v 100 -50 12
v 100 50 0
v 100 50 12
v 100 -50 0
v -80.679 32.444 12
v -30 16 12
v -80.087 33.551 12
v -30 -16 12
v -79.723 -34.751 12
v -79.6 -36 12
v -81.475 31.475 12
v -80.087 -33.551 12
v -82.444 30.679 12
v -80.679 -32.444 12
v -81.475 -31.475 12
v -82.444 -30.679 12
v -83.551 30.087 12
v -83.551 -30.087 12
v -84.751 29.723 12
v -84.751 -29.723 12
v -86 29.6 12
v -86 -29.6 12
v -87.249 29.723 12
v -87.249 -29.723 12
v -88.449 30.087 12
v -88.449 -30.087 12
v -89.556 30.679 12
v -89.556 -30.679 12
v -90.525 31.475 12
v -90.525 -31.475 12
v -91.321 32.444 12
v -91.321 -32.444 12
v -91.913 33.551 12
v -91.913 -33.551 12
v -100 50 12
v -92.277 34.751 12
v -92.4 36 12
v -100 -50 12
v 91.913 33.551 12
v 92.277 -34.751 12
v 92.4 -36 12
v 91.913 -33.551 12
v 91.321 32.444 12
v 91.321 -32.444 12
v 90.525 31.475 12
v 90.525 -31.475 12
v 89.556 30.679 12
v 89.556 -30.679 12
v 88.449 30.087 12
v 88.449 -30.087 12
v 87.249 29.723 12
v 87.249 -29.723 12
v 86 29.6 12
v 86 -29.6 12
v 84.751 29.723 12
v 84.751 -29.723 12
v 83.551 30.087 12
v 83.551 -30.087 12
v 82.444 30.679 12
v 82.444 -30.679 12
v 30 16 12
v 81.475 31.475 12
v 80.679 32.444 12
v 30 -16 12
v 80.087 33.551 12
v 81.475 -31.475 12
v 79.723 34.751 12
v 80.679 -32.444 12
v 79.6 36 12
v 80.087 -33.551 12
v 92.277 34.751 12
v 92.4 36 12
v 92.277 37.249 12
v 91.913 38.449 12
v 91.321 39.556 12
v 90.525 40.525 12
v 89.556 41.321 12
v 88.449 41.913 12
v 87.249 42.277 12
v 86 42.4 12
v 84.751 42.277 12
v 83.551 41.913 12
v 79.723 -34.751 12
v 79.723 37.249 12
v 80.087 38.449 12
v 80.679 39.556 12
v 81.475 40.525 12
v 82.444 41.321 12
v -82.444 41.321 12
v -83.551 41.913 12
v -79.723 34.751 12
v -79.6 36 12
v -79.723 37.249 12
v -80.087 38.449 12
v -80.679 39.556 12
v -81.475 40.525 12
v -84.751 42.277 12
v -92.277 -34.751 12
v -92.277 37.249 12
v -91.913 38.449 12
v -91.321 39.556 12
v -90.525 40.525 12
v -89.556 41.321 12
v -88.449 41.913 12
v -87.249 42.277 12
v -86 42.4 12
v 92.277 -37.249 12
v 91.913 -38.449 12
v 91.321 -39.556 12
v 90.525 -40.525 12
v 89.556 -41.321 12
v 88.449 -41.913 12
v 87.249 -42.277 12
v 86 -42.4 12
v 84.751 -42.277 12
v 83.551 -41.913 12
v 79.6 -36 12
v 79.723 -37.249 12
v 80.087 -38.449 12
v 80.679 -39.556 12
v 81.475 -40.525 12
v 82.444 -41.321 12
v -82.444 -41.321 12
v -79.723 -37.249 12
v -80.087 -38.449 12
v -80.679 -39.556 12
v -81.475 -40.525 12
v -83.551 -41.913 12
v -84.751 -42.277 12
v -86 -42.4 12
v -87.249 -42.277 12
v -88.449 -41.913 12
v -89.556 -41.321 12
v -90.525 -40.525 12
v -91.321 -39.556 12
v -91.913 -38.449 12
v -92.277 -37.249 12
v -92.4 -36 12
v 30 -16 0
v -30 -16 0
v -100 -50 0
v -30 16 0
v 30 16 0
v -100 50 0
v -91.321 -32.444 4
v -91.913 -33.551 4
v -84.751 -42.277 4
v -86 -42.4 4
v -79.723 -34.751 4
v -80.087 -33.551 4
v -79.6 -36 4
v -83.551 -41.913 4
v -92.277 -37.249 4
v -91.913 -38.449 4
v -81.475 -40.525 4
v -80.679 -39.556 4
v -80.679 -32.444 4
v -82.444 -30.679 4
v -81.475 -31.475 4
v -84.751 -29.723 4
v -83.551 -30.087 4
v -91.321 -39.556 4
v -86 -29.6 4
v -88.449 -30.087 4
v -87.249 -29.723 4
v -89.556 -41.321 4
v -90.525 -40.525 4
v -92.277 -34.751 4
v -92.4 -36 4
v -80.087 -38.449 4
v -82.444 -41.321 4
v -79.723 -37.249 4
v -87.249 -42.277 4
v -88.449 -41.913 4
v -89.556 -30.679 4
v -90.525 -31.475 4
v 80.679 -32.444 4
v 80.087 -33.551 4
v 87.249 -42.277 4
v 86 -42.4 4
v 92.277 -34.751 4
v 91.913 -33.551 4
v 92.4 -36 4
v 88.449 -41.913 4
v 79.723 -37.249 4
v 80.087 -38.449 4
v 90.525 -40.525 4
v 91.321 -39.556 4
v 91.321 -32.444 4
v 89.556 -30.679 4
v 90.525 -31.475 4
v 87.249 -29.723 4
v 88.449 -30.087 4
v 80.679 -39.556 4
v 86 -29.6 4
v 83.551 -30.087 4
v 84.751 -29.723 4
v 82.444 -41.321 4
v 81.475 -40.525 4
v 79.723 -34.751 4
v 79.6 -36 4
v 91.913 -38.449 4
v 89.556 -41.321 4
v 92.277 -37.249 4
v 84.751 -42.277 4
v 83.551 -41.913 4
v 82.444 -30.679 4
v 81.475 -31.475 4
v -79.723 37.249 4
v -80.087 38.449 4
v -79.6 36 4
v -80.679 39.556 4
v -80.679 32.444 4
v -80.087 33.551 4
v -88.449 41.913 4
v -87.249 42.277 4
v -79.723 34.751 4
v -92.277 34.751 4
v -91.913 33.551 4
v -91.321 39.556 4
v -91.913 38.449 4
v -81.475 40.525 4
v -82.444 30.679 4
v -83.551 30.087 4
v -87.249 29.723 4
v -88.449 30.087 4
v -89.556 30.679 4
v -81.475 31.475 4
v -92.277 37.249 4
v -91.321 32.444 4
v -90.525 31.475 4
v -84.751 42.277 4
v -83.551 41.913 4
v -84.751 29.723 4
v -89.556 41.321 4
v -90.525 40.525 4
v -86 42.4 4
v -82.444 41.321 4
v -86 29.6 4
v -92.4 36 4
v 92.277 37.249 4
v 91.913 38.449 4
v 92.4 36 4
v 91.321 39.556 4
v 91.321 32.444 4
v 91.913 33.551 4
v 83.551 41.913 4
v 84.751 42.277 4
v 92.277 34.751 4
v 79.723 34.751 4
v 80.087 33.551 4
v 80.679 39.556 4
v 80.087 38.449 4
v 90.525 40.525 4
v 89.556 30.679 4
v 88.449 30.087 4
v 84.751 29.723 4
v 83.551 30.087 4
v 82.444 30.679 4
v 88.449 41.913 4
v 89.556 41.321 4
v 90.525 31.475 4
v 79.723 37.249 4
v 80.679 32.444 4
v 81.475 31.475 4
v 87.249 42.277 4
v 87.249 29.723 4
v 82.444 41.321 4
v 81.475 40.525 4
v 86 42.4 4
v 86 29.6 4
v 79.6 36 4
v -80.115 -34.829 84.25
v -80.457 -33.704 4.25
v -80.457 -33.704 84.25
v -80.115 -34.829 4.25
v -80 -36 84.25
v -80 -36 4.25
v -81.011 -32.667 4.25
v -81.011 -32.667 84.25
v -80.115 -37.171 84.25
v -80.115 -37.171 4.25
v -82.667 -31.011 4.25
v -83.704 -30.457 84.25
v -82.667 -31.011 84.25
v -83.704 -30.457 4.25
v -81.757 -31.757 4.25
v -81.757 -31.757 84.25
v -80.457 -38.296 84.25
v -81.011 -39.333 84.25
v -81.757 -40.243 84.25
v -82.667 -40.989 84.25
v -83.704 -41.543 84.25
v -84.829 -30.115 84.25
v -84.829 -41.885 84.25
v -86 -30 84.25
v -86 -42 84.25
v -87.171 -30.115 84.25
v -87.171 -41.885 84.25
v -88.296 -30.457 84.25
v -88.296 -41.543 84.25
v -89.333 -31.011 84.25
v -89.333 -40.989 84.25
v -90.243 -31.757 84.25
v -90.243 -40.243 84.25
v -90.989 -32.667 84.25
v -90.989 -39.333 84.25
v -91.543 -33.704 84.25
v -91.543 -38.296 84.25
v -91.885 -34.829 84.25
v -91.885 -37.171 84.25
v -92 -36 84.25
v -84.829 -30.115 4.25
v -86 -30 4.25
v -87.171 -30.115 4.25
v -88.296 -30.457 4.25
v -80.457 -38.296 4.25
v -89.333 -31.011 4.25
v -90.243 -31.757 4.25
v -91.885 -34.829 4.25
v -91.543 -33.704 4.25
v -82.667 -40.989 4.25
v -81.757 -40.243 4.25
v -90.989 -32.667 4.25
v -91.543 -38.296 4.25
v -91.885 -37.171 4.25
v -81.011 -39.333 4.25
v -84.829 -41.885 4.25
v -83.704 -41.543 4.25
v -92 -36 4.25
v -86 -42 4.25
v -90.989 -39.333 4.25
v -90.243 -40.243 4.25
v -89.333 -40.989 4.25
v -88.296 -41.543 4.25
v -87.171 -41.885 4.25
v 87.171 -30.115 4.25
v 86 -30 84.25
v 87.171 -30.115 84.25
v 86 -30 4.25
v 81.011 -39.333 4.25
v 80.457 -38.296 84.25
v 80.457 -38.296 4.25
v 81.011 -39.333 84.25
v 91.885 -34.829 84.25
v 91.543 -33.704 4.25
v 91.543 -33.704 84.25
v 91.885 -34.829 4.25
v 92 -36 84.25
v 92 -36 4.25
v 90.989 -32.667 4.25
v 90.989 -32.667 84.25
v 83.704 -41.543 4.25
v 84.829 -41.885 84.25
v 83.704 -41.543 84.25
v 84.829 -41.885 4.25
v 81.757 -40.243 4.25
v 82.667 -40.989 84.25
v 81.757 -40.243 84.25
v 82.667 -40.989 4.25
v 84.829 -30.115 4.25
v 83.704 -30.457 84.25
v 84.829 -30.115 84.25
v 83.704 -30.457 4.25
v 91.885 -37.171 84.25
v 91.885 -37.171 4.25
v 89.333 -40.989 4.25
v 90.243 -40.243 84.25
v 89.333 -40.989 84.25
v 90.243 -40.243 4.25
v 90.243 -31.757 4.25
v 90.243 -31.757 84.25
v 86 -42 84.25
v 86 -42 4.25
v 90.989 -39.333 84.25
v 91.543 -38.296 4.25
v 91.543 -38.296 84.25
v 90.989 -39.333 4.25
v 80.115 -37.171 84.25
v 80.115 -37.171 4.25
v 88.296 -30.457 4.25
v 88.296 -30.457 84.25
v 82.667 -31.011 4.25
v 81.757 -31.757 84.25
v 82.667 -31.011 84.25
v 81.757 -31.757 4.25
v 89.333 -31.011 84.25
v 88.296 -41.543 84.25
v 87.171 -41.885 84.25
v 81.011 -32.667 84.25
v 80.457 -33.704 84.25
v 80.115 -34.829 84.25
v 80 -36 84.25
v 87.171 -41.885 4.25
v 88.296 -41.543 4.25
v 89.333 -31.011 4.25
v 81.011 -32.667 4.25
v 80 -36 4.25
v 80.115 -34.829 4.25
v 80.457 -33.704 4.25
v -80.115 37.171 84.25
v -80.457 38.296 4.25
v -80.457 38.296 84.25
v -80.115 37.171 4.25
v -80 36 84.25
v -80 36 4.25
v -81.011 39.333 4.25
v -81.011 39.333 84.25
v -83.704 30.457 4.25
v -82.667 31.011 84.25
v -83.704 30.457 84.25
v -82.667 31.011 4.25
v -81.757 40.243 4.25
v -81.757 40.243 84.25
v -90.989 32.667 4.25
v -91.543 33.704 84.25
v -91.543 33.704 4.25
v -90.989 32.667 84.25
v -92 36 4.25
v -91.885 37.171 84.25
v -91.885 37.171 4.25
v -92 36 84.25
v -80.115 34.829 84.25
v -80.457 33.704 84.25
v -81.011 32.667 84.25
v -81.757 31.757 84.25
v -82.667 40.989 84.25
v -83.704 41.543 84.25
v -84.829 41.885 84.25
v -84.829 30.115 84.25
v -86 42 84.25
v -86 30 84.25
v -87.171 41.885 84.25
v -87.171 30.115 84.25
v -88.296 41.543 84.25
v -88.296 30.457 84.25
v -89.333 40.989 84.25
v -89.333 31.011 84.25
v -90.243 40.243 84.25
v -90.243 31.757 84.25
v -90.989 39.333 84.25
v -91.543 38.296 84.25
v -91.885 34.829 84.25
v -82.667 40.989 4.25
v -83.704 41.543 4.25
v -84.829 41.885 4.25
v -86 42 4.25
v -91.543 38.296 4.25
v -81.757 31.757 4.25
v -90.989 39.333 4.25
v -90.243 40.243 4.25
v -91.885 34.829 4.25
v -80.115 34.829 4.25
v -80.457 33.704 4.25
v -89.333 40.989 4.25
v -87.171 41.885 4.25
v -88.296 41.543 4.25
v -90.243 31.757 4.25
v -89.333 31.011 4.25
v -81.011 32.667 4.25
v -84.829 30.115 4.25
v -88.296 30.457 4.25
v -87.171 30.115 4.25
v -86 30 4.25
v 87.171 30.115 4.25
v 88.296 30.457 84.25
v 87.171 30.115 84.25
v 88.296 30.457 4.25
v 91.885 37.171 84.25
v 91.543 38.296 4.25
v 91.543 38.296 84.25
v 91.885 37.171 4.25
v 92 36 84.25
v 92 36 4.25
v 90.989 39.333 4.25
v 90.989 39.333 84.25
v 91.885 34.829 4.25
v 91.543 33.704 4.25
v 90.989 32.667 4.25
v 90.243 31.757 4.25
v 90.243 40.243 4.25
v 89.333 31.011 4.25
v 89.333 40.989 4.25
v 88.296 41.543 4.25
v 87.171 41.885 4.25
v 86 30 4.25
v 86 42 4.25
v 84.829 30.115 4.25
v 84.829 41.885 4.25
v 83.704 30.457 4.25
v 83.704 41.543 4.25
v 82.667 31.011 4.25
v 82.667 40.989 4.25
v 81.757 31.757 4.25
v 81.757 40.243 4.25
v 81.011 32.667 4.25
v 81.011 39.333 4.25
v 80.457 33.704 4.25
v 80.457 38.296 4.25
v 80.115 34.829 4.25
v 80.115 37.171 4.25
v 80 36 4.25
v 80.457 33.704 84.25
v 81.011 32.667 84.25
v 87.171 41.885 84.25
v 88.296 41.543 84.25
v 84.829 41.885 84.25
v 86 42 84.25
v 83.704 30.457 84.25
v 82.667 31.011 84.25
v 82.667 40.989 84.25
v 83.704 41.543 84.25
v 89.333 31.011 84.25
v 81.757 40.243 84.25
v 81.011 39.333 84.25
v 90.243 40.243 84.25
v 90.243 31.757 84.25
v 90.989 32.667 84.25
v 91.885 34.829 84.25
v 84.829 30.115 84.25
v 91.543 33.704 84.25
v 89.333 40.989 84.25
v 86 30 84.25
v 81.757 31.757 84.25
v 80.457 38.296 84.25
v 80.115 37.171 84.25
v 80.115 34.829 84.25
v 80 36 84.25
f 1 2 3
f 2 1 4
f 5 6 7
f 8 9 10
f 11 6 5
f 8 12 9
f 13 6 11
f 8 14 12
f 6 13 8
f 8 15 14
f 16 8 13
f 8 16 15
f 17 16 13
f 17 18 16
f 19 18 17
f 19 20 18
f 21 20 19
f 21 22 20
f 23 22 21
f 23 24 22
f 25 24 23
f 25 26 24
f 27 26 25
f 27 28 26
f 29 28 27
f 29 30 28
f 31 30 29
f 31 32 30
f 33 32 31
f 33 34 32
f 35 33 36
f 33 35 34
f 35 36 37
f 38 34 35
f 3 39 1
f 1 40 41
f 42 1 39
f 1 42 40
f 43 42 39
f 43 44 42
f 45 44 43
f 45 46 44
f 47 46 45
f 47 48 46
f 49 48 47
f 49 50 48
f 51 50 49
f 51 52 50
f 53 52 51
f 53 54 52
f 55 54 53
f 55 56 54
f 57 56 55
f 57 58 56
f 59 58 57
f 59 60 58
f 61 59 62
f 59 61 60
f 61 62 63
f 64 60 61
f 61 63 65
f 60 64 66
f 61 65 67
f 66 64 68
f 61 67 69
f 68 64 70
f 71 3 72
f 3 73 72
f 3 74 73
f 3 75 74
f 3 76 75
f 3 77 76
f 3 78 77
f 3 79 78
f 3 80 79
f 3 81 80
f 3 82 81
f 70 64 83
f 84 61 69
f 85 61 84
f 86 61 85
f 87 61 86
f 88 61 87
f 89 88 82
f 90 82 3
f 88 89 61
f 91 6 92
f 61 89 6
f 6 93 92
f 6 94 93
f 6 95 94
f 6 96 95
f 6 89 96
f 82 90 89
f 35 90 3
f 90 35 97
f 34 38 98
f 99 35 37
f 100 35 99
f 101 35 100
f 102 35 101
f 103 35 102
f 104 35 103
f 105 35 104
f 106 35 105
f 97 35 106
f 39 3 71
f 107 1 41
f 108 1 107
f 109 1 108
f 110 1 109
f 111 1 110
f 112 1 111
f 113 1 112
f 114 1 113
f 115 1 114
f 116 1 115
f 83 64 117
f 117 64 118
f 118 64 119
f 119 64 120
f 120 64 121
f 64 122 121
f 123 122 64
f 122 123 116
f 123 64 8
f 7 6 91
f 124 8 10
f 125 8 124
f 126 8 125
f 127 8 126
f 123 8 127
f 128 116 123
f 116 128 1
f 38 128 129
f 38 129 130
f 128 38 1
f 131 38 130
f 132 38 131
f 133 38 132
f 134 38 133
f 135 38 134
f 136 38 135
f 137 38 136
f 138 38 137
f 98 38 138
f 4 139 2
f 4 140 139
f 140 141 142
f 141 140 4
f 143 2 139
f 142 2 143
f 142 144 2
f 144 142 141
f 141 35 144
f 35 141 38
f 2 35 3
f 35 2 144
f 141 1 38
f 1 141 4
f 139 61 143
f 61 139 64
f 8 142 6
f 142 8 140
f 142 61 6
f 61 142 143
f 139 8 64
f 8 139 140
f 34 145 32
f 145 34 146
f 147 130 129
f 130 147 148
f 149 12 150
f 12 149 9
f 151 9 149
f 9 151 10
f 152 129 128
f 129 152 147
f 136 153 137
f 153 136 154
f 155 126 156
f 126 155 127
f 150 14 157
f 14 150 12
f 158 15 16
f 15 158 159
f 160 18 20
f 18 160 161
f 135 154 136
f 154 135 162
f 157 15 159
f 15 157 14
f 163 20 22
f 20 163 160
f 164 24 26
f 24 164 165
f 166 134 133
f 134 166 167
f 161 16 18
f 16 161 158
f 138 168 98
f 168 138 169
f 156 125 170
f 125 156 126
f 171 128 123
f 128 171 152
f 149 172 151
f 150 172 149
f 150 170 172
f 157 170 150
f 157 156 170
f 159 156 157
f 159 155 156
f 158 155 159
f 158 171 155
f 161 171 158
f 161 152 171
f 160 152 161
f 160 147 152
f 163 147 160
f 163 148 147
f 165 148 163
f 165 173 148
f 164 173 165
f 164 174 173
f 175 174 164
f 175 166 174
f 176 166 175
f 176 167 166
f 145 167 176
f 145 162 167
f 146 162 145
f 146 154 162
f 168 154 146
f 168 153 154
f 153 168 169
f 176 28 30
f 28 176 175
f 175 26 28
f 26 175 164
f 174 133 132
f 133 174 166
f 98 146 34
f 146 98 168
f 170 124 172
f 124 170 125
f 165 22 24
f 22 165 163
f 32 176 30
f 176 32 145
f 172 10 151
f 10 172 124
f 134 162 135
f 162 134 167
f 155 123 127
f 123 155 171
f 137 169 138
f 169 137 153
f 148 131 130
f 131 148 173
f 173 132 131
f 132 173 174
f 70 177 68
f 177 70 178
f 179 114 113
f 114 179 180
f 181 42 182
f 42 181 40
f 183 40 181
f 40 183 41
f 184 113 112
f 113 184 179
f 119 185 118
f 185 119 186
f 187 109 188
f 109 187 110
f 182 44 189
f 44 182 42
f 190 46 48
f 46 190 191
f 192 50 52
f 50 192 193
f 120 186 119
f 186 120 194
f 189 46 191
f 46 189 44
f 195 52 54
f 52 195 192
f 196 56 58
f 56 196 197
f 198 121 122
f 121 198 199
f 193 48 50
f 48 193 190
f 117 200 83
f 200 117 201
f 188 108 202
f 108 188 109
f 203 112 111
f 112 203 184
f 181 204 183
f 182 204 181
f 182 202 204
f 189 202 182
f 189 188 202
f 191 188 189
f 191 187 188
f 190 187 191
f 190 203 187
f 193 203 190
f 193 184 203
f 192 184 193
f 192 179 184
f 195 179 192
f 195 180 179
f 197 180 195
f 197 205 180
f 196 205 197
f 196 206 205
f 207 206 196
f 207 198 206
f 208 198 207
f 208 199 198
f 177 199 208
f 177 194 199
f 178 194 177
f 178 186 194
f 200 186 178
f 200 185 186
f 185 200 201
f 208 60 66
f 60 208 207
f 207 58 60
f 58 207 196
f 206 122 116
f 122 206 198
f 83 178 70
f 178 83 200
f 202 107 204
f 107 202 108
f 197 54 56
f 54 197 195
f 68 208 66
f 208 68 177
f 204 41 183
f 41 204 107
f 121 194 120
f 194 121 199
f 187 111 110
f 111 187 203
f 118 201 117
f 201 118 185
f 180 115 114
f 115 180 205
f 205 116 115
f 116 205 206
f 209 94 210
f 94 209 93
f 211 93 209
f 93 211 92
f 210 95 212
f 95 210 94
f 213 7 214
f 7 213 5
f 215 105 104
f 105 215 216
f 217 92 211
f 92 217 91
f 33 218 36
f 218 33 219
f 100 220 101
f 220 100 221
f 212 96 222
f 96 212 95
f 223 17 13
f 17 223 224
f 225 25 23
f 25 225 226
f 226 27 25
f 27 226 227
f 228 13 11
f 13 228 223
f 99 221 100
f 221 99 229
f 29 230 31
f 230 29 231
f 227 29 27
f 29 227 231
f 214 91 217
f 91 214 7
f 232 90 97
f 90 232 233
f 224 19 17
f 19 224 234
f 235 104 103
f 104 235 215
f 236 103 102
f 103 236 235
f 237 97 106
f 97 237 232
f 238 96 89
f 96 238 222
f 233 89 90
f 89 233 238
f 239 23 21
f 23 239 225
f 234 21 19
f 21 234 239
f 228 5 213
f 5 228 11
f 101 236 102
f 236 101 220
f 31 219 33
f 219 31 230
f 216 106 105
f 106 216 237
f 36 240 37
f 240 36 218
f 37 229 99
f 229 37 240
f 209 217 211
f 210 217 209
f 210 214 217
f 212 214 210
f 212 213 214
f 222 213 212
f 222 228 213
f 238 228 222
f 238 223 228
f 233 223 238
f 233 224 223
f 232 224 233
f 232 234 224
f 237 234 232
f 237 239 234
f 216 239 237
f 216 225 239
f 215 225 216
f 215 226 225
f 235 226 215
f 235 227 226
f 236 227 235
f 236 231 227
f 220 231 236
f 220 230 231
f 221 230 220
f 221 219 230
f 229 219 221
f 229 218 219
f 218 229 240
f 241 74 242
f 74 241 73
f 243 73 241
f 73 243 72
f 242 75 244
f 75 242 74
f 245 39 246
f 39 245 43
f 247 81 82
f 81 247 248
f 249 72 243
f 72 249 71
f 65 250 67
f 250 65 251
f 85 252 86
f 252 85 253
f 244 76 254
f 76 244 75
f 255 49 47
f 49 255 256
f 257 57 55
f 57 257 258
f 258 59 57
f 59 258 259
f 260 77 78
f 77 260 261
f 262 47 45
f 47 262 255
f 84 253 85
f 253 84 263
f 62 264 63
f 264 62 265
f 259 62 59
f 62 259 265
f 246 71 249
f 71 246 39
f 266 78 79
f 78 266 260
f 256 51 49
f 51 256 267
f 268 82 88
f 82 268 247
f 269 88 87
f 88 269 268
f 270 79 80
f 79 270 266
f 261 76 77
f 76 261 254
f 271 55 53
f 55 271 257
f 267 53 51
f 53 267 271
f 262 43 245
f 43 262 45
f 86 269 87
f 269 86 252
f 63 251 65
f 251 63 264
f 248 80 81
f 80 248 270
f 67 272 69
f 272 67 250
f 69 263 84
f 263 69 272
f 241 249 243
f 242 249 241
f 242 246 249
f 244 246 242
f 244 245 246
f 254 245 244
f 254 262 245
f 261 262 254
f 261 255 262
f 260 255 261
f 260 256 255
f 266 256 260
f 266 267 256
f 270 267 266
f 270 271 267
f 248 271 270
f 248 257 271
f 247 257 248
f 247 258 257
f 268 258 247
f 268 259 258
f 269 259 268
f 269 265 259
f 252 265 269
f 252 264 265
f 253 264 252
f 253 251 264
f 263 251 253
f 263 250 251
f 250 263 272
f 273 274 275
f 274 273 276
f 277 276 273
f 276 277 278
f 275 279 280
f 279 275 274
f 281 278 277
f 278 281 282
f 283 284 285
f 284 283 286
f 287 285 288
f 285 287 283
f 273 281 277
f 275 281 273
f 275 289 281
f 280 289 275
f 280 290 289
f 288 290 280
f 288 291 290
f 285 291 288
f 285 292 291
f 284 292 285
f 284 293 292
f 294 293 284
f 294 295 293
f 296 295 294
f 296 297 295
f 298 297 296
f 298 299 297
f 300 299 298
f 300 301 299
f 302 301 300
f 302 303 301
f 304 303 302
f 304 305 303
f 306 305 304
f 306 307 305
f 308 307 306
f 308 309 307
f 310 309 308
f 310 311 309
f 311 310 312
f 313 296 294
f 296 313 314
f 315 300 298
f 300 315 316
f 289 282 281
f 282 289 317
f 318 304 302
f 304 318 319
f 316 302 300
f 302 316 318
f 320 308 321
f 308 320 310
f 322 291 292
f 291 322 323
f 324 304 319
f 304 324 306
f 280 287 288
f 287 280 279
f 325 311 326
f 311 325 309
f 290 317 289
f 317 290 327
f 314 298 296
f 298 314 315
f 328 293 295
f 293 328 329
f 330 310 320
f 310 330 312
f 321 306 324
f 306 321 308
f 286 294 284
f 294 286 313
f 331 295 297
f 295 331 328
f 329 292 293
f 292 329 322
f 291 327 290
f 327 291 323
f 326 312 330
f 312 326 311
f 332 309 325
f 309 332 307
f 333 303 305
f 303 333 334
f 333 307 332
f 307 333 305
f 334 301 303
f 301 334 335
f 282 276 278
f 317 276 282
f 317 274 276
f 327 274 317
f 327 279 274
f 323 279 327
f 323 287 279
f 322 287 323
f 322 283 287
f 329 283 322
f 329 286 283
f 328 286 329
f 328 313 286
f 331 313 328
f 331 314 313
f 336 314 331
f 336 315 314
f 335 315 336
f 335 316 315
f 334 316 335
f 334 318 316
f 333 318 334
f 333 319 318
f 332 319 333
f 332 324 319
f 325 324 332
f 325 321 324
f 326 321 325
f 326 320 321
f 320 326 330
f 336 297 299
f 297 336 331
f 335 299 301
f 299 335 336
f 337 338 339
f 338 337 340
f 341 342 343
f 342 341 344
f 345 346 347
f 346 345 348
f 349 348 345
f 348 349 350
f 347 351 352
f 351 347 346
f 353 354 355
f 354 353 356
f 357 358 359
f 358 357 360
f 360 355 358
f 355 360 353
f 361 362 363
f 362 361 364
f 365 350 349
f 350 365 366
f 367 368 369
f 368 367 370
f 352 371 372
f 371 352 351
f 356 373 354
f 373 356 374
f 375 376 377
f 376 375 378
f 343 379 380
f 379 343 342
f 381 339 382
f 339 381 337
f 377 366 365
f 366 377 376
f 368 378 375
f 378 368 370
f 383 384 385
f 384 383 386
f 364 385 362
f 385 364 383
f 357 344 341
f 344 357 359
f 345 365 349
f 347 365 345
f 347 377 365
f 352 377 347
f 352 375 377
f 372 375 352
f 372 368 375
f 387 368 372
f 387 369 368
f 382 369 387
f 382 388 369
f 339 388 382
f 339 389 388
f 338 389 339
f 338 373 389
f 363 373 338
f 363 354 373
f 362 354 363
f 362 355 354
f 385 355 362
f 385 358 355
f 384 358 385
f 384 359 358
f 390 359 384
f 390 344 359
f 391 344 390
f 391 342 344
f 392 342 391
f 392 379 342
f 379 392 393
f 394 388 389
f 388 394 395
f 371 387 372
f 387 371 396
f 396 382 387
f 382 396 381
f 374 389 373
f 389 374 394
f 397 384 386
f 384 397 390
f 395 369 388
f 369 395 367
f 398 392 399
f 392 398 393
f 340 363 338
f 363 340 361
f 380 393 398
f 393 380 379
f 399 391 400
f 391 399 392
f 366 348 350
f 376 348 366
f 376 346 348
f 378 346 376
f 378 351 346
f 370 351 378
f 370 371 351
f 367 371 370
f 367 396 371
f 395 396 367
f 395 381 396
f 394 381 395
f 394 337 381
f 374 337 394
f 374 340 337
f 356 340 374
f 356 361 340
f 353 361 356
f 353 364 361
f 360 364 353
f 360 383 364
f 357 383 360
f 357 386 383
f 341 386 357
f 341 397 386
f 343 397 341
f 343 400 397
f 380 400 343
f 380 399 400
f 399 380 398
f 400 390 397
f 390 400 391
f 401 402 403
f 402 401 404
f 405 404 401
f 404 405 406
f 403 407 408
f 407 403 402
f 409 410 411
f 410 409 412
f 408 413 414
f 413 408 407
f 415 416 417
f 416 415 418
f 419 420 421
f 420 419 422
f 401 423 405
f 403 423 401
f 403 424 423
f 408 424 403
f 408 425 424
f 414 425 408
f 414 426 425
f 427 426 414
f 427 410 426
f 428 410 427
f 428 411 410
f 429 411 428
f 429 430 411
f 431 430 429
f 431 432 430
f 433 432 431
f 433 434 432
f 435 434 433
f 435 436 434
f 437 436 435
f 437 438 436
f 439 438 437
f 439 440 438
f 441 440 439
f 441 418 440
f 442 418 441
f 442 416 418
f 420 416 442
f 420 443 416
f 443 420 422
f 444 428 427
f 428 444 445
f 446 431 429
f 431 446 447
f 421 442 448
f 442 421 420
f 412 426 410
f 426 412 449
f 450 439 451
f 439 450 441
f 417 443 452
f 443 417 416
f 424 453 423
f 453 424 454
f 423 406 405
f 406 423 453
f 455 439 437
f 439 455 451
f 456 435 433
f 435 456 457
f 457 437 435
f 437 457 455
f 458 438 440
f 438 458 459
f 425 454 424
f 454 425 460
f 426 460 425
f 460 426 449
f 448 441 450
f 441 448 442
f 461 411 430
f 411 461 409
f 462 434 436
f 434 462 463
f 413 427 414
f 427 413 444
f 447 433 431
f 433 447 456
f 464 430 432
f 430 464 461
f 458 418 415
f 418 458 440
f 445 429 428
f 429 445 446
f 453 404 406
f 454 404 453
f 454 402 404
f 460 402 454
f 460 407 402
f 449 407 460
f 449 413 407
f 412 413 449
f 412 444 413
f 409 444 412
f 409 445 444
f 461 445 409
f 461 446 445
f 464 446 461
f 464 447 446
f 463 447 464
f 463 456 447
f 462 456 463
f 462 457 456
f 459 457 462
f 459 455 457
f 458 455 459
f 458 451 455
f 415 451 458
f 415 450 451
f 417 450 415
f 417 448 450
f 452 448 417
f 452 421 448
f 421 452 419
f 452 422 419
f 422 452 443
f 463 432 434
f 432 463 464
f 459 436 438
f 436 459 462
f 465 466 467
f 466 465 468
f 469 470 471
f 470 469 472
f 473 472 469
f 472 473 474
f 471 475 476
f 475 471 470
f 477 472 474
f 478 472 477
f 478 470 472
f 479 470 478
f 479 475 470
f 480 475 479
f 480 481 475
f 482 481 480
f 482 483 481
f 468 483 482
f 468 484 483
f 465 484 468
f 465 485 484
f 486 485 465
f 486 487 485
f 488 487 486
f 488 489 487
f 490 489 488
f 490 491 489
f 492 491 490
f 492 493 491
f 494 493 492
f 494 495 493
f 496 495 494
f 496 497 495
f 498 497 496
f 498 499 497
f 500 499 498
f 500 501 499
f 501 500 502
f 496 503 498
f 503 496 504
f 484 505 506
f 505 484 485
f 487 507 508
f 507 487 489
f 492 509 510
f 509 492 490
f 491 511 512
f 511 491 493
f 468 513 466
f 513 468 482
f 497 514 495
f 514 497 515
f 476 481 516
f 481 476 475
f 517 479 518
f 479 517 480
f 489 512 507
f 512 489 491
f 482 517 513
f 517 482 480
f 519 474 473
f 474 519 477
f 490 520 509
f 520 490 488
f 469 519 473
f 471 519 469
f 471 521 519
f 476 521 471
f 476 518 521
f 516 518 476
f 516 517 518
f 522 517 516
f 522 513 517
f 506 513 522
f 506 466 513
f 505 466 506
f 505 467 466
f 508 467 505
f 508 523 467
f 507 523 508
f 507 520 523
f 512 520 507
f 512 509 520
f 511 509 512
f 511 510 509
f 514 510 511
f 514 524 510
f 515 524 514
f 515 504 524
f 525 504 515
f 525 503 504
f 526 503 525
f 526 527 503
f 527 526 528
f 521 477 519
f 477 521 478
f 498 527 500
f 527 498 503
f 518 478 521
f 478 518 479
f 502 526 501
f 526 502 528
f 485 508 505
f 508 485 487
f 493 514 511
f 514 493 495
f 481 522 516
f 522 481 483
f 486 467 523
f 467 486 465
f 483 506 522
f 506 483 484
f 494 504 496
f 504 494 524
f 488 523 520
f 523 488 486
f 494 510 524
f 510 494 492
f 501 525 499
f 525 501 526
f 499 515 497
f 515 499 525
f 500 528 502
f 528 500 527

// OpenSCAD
$fn = 32;

// ------------------------------------------------------------------------
// Frame with four posts: 200 x 100 mm frame, four d12 posts
// Every part is its own module, assembly() places them once.
// ------------------------------------------------------------------------

// --- part 1 ---
module base_frame() {
  difference() {
    translate([-100, -50, 0]) cube([200, 100, 12]);
    translate([-30, -16, -1]) cube([60, 32, 14]);
    translate([-86, -36, 4]) cylinder(h = 9, d = 12.8);
    translate([86, -36, 4]) cylinder(h = 9, d = 12.8);
    translate([-86, 36, 4]) cylinder(h = 9, d = 12.8);
    translate([86, 36, 4]) cylinder(h = 9, d = 12.8);
  }
}

// --- part 2 ---
module post1() {
  cylinder(h = 80, d = 12);
}

// --- part 3 ---
module post2() {
  cylinder(h = 80, d = 12);
}

// --- part 4 ---
module post3() {
  cylinder(h = 80, d = 12);
}

// --- part 5 ---
module post4() {
  cylinder(h = 80, d = 12);
}

// --- assembly ---
module assembly() {
  translate([0, 0, 0]) rotate([0, 0, 0]) base_frame();
  translate([-86, -36, 4.25]) rotate([0, 0, 0]) post1();
  translate([86, -36, 4.25]) rotate([0, 0, 0]) post2();
  translate([-86, 36, 4.25]) rotate([0, 0, 0]) post3();
  translate([86, 36, 4.25]) rotate([0, 0, 0]) post4();
}

assembly();
